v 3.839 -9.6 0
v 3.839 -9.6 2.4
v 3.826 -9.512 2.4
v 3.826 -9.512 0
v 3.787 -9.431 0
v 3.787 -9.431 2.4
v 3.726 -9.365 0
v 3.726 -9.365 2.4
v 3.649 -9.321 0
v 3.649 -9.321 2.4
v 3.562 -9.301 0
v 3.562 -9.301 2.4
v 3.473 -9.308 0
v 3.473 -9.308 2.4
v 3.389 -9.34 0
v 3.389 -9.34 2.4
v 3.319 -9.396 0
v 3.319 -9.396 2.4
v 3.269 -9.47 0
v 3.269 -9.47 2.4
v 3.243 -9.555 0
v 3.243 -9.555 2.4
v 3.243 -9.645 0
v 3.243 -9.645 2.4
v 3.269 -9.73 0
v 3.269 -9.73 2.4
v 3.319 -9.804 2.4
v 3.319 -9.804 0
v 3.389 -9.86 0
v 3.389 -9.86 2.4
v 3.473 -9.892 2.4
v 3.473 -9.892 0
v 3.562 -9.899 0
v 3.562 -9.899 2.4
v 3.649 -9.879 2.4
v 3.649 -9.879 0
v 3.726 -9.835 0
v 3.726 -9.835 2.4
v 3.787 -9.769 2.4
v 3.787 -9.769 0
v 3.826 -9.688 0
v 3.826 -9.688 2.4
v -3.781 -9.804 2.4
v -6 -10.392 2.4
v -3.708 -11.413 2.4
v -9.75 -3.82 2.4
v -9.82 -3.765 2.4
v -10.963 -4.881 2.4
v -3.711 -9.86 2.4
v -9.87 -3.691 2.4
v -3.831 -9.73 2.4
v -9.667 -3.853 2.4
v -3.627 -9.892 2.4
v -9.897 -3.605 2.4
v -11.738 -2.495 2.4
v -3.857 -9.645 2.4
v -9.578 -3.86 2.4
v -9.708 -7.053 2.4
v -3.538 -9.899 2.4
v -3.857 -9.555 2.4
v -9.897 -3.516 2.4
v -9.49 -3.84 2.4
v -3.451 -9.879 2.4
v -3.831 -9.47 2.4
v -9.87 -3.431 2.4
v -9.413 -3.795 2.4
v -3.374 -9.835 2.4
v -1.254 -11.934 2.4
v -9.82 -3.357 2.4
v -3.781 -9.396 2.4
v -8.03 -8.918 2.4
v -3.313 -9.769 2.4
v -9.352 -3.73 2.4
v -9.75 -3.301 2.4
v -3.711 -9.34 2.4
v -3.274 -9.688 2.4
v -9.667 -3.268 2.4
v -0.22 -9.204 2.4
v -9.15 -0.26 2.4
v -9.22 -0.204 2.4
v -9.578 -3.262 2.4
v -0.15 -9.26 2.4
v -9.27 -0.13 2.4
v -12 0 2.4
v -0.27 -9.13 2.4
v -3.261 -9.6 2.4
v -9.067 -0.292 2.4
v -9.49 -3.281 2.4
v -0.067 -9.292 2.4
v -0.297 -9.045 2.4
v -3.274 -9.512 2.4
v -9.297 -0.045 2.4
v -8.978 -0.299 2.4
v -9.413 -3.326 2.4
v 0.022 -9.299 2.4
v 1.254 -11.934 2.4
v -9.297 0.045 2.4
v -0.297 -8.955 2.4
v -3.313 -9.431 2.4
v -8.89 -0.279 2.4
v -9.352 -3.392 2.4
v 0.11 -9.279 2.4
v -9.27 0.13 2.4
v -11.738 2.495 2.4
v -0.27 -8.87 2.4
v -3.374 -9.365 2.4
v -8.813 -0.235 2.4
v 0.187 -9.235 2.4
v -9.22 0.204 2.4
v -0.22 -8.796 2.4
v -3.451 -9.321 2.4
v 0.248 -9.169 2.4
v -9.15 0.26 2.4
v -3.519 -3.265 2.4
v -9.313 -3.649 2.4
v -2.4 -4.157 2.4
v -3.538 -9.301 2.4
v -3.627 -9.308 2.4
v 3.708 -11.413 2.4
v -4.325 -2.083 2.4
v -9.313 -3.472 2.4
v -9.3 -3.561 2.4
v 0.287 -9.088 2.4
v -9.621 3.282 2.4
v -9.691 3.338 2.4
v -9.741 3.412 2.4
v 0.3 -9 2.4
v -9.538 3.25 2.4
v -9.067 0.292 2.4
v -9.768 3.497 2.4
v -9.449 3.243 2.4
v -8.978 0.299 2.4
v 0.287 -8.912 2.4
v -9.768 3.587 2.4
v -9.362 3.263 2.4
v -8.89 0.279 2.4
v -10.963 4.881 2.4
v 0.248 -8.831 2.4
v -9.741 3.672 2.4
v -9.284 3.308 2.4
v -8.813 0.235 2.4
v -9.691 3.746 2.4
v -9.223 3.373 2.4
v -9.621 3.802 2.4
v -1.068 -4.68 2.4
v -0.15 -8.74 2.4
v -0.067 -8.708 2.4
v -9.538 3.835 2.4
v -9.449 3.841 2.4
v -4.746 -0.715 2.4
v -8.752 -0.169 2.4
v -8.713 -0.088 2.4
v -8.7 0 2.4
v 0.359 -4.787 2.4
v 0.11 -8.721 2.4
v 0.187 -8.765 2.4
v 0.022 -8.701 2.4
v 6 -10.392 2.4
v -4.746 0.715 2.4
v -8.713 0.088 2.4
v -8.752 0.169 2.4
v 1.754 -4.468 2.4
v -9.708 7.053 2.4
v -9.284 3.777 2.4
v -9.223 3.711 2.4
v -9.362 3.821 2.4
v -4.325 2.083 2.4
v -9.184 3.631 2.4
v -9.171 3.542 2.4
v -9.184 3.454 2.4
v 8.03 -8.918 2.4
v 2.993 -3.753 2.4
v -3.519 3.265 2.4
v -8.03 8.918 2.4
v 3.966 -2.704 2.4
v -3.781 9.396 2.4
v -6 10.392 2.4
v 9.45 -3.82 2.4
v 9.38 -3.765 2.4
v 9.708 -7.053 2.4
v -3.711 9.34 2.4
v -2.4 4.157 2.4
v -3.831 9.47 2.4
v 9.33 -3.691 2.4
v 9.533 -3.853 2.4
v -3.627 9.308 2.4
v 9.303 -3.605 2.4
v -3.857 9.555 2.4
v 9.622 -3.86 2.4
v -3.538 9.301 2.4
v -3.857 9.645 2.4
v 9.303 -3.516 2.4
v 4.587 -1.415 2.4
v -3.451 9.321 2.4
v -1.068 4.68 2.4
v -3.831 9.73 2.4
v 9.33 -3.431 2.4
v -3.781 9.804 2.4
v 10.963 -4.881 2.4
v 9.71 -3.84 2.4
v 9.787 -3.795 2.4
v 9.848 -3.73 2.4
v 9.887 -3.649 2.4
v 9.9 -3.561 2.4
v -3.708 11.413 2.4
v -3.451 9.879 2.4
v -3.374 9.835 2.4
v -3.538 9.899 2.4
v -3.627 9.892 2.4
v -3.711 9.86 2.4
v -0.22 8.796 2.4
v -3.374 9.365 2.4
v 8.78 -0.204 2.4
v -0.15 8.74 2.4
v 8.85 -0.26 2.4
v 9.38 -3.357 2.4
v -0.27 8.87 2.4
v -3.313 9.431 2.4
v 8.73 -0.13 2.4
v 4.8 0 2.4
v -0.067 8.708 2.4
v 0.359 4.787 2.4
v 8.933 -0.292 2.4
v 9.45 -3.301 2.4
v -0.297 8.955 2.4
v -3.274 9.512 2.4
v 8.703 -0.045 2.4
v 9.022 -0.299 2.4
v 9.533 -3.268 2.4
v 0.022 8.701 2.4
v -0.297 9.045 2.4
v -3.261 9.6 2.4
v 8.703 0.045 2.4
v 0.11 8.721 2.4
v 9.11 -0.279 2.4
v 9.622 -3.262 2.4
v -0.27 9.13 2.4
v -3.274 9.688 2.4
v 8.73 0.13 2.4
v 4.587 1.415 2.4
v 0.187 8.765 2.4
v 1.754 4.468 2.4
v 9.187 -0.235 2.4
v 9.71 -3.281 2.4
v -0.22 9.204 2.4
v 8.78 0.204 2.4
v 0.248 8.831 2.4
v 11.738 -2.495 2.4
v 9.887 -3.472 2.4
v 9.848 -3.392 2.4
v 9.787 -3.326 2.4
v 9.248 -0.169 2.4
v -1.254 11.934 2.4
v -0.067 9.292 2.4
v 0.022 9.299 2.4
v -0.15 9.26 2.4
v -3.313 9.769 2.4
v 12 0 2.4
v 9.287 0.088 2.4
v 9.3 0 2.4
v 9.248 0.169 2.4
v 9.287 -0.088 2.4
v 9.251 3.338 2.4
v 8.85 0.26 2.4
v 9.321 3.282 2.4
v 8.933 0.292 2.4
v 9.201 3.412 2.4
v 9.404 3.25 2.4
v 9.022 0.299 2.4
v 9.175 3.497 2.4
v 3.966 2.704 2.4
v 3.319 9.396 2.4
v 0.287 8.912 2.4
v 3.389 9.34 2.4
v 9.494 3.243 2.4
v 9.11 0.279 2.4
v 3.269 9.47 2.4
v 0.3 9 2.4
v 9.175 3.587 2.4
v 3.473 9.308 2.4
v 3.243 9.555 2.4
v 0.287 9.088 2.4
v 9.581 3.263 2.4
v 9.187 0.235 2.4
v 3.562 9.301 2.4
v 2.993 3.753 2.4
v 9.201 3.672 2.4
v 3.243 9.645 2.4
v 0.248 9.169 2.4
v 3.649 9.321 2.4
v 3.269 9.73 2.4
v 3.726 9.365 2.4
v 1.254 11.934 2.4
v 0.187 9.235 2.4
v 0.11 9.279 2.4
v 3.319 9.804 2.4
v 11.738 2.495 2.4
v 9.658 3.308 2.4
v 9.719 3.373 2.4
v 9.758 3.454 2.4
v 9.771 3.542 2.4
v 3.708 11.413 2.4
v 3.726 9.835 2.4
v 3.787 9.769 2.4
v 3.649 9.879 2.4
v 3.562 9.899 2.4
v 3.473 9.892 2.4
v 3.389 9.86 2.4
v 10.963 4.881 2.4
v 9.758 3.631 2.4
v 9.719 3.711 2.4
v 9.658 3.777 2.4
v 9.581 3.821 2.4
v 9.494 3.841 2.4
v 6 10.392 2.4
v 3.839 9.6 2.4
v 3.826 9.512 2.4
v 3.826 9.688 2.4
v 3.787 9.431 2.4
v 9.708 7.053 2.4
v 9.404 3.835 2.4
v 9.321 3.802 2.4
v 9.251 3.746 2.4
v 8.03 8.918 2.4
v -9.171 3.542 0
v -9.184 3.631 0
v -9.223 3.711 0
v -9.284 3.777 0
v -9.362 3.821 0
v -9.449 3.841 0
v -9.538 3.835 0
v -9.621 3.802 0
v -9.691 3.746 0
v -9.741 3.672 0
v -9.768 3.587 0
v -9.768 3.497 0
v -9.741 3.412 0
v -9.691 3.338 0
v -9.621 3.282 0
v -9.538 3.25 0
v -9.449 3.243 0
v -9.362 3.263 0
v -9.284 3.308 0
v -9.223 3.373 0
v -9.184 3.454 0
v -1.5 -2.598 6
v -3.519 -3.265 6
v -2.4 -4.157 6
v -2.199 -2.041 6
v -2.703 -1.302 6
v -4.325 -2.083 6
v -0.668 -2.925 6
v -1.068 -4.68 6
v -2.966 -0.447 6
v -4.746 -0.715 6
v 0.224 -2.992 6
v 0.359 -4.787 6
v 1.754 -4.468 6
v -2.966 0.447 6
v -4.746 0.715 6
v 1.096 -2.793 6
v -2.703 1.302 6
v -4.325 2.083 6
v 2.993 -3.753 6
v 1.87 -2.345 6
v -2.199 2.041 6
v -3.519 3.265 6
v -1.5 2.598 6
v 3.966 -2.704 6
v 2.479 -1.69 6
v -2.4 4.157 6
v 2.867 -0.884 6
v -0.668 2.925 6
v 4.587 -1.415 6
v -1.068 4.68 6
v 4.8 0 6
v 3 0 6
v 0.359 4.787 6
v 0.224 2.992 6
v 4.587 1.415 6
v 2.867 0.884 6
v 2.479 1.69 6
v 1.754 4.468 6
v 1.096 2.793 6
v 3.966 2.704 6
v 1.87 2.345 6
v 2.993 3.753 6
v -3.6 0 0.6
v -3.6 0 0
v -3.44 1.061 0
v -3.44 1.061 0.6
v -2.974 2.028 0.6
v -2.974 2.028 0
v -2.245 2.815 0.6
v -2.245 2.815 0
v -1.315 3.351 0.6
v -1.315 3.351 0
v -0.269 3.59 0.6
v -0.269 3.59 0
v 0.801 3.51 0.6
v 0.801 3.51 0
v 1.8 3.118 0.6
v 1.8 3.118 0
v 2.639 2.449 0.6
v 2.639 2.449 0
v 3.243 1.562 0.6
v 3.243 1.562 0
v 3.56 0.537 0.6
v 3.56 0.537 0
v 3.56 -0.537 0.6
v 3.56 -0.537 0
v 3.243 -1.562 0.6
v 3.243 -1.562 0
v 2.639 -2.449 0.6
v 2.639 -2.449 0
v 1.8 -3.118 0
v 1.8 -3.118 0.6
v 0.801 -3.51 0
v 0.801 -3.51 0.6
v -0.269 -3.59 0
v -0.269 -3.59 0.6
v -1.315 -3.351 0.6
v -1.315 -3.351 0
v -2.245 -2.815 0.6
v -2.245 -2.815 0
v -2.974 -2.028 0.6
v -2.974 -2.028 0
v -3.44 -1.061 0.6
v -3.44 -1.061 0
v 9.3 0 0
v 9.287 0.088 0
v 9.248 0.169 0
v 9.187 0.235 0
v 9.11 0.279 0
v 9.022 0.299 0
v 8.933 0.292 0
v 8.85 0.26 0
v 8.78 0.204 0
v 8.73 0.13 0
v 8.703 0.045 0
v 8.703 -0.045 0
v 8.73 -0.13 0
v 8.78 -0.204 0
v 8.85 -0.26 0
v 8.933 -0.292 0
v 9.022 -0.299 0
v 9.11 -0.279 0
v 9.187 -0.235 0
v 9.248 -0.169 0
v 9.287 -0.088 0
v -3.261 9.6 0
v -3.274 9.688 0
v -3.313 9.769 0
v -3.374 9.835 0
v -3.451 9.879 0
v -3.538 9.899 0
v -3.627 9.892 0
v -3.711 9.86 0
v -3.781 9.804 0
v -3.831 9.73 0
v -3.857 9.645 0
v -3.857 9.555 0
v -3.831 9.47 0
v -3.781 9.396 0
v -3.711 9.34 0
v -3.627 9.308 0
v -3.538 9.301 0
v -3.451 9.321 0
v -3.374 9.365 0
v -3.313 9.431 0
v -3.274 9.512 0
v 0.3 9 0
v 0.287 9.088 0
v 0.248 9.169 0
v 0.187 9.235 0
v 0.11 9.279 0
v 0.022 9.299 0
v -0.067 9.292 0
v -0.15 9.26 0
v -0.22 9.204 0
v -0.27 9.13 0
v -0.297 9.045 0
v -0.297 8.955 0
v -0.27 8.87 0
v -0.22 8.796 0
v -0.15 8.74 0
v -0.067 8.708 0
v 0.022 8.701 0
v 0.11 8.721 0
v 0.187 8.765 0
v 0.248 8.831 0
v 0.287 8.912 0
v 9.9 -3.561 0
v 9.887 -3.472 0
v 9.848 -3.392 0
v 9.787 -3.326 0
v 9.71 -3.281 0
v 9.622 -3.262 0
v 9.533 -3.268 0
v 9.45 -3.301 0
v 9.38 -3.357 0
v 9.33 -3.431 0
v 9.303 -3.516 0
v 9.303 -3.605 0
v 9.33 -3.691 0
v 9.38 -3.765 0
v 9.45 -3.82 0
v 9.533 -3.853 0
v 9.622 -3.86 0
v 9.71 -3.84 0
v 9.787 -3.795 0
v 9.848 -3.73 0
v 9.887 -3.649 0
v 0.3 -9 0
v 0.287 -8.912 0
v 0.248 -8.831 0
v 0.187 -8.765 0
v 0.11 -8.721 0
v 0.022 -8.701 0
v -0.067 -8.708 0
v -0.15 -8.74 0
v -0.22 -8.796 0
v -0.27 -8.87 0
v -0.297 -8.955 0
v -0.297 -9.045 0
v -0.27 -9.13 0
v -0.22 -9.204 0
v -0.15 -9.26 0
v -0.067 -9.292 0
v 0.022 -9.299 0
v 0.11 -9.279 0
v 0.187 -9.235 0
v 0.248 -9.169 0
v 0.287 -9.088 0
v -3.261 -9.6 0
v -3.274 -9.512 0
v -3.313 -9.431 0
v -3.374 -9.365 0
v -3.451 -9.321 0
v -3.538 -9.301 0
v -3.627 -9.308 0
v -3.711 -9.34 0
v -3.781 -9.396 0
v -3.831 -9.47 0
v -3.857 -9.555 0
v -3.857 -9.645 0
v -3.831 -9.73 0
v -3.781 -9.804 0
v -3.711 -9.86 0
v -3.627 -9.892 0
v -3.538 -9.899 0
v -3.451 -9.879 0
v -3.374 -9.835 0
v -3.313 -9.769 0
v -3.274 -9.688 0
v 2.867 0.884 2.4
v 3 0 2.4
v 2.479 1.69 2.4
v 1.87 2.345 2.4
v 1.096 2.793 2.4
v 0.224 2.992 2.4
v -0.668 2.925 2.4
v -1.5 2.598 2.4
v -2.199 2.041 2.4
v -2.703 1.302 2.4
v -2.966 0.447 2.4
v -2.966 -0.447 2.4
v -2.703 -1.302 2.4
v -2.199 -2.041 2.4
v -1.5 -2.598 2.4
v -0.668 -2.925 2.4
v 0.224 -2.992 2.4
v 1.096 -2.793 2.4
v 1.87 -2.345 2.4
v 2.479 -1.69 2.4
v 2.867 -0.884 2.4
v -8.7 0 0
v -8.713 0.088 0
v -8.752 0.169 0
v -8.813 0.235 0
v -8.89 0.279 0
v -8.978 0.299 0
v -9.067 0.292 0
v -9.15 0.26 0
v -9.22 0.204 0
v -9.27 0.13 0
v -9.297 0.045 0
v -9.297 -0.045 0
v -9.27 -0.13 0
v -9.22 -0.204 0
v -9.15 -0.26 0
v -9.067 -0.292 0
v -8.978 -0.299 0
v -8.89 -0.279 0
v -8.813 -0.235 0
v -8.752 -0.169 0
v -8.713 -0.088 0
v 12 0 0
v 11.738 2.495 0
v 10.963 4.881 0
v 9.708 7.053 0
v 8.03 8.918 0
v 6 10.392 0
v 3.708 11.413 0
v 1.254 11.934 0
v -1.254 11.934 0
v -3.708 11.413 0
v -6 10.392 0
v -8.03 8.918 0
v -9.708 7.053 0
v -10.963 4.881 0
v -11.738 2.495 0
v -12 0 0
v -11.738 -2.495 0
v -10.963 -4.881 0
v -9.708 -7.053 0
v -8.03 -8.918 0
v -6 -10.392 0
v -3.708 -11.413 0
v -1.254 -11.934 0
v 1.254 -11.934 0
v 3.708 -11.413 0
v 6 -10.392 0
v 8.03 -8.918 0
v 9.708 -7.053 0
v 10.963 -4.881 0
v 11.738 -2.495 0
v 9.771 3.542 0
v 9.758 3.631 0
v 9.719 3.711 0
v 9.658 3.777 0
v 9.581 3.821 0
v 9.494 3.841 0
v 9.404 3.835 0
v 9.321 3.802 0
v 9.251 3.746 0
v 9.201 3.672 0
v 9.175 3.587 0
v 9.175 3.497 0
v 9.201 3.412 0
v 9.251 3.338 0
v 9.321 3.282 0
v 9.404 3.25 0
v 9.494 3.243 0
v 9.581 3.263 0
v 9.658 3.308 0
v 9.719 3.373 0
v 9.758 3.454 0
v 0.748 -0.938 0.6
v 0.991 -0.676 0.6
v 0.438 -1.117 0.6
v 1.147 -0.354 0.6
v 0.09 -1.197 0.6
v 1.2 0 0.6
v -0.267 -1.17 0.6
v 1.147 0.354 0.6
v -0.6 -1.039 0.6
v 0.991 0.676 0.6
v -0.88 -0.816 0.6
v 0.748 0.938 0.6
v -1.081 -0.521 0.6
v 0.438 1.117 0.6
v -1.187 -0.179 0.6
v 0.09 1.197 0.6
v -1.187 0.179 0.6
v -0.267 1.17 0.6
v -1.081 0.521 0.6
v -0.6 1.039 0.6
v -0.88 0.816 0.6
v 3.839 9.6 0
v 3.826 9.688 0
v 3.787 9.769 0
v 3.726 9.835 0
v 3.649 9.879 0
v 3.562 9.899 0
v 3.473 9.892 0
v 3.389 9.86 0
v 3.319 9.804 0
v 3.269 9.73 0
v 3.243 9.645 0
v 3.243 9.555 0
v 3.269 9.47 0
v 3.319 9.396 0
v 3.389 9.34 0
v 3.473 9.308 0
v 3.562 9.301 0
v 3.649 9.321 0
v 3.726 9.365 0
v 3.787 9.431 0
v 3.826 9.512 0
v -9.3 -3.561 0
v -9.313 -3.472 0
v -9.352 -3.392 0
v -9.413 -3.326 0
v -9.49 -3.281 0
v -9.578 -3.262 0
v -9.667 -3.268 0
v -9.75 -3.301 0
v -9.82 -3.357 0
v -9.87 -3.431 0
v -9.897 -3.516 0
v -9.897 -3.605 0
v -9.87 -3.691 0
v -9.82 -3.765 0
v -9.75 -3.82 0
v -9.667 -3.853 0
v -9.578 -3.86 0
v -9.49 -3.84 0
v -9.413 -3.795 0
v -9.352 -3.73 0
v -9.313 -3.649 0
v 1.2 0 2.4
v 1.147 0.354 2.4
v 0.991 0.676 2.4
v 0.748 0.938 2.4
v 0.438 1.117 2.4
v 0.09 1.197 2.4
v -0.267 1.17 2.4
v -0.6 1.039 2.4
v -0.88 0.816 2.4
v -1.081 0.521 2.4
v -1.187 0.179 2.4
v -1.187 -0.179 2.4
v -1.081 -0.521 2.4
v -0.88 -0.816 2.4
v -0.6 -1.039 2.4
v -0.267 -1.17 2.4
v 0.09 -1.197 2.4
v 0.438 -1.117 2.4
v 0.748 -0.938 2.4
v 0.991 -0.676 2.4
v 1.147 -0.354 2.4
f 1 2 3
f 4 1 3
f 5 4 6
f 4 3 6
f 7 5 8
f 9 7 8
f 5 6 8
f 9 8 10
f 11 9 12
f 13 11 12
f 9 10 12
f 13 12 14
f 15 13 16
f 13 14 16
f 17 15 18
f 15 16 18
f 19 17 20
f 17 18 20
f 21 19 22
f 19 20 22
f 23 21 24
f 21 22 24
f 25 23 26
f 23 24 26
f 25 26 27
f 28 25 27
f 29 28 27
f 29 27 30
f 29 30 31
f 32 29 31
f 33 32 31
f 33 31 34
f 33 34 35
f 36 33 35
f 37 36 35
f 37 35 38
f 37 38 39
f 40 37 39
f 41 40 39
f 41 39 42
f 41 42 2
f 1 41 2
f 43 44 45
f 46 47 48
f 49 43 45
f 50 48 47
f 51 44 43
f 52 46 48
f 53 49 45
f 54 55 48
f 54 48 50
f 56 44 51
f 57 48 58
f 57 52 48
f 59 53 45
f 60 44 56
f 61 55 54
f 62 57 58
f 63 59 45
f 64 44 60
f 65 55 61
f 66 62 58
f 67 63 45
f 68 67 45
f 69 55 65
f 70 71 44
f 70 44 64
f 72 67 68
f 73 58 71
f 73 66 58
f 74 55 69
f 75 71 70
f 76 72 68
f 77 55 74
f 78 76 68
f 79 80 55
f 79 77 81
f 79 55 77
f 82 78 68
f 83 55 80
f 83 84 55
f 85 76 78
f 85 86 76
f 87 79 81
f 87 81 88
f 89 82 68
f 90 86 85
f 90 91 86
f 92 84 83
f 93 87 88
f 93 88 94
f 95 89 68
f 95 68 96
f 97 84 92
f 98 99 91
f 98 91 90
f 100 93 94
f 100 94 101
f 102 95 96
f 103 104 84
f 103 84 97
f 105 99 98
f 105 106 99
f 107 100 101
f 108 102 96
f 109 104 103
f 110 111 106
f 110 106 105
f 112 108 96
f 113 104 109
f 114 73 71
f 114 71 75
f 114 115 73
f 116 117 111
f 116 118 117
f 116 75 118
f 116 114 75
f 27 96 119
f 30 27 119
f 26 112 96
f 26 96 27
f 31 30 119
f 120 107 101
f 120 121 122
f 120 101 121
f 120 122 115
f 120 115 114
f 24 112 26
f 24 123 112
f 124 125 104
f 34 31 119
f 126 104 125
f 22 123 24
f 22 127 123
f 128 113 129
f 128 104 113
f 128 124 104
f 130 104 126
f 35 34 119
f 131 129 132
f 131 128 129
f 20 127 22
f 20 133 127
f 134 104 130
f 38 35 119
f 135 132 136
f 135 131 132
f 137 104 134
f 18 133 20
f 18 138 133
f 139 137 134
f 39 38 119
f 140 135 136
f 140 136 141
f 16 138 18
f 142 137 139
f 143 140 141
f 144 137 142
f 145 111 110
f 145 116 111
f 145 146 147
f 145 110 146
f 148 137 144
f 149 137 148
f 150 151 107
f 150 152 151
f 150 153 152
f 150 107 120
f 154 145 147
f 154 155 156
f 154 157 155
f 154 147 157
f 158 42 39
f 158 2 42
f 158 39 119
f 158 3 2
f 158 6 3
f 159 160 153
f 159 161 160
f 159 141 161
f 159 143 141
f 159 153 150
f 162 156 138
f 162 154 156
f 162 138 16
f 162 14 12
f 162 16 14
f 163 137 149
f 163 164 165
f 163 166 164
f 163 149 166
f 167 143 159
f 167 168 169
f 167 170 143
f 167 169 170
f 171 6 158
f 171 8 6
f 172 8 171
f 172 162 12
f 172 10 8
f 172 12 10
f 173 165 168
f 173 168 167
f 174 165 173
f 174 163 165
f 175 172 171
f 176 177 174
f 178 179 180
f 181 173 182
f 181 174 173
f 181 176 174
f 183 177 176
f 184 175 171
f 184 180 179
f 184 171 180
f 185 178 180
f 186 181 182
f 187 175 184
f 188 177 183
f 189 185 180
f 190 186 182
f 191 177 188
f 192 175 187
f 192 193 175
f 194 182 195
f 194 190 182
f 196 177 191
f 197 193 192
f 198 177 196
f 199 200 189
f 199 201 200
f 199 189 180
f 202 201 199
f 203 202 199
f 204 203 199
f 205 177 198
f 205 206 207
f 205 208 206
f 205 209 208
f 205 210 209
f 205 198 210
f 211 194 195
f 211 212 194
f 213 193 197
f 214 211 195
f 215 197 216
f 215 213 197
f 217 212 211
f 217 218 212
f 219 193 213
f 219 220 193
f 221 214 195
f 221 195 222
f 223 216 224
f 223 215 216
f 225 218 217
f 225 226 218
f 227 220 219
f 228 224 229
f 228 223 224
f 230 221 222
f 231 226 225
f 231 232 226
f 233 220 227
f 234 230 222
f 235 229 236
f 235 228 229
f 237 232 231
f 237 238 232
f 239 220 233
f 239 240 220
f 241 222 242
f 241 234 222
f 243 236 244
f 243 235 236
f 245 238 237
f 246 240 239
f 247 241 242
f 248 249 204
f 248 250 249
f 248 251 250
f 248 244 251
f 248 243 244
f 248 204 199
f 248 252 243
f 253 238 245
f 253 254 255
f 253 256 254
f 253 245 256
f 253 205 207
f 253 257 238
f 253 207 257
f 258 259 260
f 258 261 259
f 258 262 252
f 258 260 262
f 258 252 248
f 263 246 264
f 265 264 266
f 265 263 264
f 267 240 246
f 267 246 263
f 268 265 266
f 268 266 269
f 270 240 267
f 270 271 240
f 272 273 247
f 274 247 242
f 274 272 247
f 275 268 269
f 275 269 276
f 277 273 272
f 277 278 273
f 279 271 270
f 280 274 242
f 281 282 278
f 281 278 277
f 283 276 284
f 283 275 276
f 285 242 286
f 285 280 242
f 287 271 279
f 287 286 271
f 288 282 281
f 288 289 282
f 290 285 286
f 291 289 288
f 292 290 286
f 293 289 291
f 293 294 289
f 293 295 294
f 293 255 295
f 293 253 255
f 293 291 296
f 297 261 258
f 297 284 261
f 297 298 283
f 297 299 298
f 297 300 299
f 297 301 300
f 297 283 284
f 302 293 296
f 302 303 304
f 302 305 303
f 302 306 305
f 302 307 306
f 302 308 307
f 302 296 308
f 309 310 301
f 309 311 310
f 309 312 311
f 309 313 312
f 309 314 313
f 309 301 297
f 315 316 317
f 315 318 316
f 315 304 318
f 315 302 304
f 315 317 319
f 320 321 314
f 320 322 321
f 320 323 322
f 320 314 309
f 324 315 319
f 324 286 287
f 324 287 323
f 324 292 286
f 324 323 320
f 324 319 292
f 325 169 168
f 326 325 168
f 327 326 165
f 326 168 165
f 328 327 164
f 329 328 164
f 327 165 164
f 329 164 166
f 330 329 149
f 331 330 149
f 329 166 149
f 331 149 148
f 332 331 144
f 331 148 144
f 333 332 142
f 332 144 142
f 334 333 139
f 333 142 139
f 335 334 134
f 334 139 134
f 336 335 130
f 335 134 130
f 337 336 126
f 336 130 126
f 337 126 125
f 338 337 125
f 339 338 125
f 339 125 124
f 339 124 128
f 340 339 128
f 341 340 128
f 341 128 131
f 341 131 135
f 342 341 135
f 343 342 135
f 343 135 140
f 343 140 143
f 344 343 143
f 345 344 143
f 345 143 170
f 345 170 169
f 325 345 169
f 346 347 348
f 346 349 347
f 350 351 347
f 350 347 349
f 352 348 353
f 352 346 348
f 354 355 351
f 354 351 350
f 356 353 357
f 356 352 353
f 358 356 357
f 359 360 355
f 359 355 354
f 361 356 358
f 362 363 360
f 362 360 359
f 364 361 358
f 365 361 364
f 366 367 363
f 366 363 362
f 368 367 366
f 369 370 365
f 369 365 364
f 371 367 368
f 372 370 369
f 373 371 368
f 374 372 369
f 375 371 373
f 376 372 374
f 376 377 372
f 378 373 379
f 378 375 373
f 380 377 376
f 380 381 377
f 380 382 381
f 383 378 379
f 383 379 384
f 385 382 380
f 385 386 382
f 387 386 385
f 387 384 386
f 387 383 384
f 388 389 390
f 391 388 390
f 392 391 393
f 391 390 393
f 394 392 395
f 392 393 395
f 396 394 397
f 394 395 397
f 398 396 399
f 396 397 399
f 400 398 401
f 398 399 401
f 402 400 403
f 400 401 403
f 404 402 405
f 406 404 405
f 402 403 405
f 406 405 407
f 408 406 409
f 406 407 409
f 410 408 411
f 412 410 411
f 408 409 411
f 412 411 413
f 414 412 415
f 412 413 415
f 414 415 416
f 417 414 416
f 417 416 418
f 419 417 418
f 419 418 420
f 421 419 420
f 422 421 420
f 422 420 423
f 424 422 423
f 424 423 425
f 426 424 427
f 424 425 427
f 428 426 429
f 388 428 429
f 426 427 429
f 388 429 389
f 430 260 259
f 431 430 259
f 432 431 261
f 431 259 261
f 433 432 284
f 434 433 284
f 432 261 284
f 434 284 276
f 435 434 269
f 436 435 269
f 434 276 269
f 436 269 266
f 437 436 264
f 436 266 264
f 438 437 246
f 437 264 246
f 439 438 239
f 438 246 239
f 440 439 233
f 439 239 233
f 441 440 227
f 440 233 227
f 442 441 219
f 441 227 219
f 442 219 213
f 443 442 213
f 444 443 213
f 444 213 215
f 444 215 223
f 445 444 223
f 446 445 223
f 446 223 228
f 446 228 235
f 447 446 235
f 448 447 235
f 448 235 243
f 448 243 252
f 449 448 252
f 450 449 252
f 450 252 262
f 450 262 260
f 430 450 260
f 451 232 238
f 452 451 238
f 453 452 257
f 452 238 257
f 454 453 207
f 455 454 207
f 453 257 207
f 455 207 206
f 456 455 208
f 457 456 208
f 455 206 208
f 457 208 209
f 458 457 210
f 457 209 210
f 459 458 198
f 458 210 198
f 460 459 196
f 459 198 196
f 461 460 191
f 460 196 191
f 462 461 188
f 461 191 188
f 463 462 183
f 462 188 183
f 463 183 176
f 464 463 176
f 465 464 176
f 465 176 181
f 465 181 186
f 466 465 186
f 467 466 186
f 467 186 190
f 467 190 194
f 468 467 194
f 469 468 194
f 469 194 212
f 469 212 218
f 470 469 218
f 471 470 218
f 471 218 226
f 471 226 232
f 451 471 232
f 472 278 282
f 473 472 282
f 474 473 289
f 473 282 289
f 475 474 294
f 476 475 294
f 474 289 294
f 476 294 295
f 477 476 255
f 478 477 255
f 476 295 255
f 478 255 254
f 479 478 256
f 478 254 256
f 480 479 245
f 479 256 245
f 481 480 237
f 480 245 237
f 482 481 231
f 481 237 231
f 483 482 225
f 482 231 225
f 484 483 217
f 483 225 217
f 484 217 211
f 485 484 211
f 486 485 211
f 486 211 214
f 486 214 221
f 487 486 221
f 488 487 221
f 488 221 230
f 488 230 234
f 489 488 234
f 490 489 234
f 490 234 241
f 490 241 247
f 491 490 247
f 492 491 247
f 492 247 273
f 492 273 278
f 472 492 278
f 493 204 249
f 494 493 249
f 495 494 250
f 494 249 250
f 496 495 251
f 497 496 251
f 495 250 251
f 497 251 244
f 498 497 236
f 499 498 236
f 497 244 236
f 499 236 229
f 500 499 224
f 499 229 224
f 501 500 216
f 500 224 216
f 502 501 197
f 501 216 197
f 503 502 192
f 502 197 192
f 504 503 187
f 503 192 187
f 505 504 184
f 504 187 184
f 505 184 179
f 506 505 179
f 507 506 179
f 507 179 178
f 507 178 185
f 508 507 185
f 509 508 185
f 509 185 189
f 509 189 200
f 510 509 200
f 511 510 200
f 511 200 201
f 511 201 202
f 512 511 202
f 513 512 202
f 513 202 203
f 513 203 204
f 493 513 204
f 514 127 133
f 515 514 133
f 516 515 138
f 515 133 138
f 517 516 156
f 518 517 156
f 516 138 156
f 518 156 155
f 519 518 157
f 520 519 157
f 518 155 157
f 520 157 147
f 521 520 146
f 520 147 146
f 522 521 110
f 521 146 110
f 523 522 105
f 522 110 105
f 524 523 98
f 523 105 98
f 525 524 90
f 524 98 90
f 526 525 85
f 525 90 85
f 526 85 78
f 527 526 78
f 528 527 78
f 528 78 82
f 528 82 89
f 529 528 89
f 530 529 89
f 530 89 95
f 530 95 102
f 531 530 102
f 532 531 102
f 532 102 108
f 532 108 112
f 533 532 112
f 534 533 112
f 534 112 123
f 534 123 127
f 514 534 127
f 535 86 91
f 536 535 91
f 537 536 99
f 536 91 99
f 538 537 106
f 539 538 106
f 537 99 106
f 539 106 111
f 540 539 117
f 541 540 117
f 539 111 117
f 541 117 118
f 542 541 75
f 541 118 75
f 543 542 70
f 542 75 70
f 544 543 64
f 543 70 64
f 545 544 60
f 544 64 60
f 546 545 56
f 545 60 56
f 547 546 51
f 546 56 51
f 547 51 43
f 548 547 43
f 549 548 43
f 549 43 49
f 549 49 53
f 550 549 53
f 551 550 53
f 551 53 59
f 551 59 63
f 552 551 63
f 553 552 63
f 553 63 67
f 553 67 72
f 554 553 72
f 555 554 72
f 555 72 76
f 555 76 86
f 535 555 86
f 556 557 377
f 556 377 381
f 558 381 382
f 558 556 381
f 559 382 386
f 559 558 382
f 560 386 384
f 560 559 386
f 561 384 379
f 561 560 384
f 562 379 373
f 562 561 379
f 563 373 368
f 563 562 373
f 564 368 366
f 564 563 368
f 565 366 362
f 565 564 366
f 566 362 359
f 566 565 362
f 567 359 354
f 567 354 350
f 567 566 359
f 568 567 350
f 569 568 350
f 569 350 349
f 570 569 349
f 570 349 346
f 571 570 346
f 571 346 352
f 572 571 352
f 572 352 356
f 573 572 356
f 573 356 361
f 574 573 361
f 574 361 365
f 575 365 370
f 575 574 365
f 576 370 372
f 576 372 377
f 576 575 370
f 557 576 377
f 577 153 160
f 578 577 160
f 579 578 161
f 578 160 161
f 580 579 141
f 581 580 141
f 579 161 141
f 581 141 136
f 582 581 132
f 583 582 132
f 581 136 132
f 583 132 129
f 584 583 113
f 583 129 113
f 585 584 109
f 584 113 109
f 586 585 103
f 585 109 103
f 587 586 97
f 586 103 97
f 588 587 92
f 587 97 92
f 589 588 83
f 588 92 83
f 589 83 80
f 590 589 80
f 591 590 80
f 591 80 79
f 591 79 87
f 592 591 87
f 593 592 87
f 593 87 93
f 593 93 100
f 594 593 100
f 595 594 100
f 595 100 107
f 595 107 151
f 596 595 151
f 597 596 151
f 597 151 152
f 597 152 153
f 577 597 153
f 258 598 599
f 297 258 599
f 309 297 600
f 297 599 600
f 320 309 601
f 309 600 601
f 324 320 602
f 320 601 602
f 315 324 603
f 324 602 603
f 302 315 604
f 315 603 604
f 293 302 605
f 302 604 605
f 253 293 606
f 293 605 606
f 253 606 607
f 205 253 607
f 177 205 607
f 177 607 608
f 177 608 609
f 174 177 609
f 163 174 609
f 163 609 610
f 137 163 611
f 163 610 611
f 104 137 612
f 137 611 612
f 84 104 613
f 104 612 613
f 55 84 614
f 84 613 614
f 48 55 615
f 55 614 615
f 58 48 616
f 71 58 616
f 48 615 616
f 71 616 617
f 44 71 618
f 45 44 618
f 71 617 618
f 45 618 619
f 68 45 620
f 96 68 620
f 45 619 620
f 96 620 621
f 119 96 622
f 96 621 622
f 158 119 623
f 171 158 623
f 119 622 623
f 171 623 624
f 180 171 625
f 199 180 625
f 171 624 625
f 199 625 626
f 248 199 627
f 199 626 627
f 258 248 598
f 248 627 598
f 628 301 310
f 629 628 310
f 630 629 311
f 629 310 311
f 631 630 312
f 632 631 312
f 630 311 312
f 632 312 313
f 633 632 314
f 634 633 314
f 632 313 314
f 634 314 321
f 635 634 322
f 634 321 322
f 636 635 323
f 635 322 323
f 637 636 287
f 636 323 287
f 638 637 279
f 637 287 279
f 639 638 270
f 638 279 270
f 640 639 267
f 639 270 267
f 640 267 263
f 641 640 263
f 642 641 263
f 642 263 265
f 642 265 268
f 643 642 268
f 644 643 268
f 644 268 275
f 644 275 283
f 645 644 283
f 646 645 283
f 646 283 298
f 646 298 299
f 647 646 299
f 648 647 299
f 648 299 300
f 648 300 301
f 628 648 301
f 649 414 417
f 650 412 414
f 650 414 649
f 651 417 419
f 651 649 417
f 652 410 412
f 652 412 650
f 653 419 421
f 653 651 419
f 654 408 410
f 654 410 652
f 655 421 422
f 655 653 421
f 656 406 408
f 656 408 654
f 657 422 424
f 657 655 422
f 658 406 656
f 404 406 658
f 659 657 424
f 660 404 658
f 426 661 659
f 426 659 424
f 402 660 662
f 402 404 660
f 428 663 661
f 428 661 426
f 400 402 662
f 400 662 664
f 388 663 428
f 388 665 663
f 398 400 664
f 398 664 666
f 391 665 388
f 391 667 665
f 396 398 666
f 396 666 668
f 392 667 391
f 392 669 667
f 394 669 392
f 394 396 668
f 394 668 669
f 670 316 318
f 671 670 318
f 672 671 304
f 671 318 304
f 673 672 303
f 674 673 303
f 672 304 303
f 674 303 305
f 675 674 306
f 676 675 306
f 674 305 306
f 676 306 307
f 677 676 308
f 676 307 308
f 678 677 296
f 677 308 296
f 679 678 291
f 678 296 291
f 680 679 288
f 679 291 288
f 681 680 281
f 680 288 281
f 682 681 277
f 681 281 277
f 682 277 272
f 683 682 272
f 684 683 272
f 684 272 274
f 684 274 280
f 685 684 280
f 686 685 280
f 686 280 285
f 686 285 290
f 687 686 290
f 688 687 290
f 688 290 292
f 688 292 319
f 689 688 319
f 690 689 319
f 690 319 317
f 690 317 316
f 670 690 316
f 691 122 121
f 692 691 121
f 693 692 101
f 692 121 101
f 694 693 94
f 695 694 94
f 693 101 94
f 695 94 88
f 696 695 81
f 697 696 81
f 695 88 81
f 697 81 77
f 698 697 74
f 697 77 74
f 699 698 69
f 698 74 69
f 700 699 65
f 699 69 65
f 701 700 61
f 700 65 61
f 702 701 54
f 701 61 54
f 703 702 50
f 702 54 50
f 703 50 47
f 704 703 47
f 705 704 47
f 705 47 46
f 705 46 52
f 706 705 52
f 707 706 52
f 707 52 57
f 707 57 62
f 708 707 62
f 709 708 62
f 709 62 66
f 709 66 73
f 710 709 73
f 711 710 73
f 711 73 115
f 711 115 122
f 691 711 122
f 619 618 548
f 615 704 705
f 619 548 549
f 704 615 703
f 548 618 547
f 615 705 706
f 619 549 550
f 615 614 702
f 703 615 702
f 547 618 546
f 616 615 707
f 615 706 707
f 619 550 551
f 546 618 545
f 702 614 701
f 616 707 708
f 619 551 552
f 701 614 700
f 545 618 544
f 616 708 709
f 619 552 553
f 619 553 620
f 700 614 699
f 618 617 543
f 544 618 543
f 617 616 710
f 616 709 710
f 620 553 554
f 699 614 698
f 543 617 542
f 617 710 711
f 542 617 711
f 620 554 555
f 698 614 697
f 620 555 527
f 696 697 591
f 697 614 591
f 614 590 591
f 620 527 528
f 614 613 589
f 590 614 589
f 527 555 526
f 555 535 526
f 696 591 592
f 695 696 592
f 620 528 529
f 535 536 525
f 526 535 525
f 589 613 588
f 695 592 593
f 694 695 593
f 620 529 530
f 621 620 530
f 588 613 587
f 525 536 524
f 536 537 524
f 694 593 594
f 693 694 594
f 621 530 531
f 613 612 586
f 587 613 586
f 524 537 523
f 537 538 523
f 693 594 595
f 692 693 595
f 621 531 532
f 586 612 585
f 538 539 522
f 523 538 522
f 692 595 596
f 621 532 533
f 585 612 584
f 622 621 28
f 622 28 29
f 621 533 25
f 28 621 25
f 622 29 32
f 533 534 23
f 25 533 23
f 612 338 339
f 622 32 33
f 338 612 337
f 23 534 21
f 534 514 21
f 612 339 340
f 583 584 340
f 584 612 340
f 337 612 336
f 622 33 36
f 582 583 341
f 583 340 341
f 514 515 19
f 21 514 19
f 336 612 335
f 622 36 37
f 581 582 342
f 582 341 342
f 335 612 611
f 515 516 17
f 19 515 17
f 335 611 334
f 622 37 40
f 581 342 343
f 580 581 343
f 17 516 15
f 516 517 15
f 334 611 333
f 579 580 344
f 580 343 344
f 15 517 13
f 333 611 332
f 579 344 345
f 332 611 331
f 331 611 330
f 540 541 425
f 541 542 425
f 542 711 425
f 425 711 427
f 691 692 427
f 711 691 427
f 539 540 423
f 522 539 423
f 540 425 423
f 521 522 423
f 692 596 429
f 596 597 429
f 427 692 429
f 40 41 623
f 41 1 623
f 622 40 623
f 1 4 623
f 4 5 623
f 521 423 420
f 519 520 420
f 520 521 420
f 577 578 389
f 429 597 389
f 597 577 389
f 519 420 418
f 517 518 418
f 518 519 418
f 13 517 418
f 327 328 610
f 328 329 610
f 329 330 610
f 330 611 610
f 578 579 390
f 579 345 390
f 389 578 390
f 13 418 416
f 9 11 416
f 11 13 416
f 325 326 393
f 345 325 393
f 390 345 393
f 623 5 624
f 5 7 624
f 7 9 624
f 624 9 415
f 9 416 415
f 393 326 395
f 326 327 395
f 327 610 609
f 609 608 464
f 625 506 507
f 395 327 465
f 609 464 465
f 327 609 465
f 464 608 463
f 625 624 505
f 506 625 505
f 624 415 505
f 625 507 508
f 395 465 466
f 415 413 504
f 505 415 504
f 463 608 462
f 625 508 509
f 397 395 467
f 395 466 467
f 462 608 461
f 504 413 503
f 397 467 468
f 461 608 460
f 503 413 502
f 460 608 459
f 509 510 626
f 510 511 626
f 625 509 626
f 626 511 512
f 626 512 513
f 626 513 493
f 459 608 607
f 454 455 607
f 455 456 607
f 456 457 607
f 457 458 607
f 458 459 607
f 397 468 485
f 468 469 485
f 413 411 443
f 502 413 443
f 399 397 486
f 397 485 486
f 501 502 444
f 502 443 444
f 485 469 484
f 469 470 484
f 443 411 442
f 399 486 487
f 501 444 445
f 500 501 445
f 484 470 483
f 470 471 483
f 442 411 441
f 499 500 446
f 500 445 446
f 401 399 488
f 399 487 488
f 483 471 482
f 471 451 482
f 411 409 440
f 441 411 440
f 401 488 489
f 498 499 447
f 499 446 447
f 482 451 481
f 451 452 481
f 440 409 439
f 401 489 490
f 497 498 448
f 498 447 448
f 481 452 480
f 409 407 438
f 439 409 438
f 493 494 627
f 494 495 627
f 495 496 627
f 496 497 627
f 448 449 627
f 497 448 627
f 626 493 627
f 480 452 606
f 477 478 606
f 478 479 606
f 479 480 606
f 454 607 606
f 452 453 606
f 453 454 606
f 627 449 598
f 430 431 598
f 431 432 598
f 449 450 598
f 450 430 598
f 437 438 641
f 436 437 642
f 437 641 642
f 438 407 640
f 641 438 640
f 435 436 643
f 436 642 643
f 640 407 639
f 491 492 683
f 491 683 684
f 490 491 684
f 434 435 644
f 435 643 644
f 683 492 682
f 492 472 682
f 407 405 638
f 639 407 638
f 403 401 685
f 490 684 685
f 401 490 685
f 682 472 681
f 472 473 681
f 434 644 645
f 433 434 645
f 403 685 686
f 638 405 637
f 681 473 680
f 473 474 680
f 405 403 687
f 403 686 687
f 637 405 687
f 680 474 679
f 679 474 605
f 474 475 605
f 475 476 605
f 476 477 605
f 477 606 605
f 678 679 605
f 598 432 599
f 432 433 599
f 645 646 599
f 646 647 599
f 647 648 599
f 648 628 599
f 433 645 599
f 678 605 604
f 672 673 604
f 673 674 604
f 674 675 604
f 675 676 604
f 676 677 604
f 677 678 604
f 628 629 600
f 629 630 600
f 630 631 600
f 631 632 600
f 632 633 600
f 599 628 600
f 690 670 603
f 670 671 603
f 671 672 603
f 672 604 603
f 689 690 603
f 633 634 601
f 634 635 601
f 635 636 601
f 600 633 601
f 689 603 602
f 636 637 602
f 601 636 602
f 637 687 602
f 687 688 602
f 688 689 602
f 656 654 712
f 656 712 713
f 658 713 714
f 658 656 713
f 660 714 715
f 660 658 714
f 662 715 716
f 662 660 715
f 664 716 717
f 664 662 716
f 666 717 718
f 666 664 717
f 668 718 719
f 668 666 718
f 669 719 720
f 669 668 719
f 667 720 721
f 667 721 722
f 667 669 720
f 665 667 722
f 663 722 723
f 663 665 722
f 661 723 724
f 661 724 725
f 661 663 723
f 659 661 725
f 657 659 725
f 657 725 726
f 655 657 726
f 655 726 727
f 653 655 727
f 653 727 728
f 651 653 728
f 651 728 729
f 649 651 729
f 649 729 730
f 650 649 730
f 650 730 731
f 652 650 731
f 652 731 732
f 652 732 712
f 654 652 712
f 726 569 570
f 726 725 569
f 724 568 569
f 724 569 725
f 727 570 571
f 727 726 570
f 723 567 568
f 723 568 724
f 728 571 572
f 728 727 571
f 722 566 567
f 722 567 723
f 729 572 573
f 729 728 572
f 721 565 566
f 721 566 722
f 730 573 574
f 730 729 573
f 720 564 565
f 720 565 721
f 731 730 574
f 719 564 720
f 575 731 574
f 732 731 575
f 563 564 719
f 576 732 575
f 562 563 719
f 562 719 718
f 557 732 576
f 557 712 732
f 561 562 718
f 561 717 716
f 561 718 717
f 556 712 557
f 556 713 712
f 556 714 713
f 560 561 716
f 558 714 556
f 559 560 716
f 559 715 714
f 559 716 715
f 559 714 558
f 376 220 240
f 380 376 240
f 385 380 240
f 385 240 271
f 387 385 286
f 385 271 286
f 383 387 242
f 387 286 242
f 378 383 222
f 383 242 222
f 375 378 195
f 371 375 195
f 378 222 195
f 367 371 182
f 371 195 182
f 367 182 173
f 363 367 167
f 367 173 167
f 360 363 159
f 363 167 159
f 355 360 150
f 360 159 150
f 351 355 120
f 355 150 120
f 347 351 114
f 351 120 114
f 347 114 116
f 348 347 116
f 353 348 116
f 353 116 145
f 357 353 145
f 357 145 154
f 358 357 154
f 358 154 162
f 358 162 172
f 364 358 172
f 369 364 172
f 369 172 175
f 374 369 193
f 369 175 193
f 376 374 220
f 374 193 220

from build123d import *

# Parameters (mm, degrees)
ESQUISSE1_R             = 12
ESQUISSE1_R_2           = 1.2
BOSS_EXTRU_2_DEPTH      = 2.4
ESQUISSE3_R             = 4.8
ESQUISSE3_R_2           = 3
BOSS_EXTRU_3_DEPTH      = 3.6
ESQUISSE4_R             = 0.3
ENL_V_MAT_EXTRU_1_DEPTH = 3.6
ESQUISSE5_R             = 3.6
ENL_V_MAT_EXTRU_2_DEPTH = 0.6


with BuildPart() as part:
    # Esquisse1 → Boss.-Extru.2 (new body)
    with BuildSketch(Plane.XY):
        Circle(ESQUISSE1_R)
        Circle(ESQUISSE1_R_2, mode=Mode.SUBTRACT)
    extrude(amount=BOSS_EXTRU_2_DEPTH)

    # Esquisse3 → Boss.-Extru.3 (add)
    with BuildSketch(Plane.XY.offset(2.4)):
        Circle(ESQUISSE3_R)
        Circle(ESQUISSE3_R_2, mode=Mode.SUBTRACT)
    extrude(amount=BOSS_EXTRU_3_DEPTH)

    # Esquisse4 → Enlèv. mat.-Extru.1 (cut)
    with BuildSketch(Plane.XY.offset(2.4)):
        with Locations((-9.6, -3.560674829)):
            Circle(ESQUISSE4_R)
        with Locations((-3.560674829, 9.6)):
            Circle(ESQUISSE4_R)
        with Locations((-9, 0)):
            Circle(ESQUISSE4_R)
        with Locations((-9.471169928, 3.542156917)):
            Circle(ESQUISSE4_R)
        with Locations((0, 9)):
            Circle(ESQUISSE4_R)
        with Locations((3.539325171, 9.6)):
            Circle(ESQUISSE4_R)
        with Locations((9.6, -3.560674829)):
            Circle(ESQUISSE4_R)
        with Locations((9, 0)):
            Circle(ESQUISSE4_R)
        with Locations((9.471169928, 3.542156917)):
            Circle(ESQUISSE4_R)
        with Locations((3.539325171, -9.6)):
            Circle(ESQUISSE4_R)
        with Locations((0, -9)):
            Circle(ESQUISSE4_R)
        with Locations((-3.560674829, -9.6)):
            Circle(ESQUISSE4_R)
    extrude(amount=-ENL_V_MAT_EXTRU_1_DEPTH, mode=Mode.SUBTRACT)

    # Esquisse5 → Enlèv. mat.-Extru.2 (cut)
    with BuildSketch(Plane(origin=(0, 0, 0), x_dir=(-1, 0, 0), z_dir=(0, 0, -1))):
        Circle(ESQUISSE5_R)
    extrude(amount=-ENL_V_MAT_EXTRU_2_DEPTH, mode=Mode.SUBTRACT)


solid = part.part
